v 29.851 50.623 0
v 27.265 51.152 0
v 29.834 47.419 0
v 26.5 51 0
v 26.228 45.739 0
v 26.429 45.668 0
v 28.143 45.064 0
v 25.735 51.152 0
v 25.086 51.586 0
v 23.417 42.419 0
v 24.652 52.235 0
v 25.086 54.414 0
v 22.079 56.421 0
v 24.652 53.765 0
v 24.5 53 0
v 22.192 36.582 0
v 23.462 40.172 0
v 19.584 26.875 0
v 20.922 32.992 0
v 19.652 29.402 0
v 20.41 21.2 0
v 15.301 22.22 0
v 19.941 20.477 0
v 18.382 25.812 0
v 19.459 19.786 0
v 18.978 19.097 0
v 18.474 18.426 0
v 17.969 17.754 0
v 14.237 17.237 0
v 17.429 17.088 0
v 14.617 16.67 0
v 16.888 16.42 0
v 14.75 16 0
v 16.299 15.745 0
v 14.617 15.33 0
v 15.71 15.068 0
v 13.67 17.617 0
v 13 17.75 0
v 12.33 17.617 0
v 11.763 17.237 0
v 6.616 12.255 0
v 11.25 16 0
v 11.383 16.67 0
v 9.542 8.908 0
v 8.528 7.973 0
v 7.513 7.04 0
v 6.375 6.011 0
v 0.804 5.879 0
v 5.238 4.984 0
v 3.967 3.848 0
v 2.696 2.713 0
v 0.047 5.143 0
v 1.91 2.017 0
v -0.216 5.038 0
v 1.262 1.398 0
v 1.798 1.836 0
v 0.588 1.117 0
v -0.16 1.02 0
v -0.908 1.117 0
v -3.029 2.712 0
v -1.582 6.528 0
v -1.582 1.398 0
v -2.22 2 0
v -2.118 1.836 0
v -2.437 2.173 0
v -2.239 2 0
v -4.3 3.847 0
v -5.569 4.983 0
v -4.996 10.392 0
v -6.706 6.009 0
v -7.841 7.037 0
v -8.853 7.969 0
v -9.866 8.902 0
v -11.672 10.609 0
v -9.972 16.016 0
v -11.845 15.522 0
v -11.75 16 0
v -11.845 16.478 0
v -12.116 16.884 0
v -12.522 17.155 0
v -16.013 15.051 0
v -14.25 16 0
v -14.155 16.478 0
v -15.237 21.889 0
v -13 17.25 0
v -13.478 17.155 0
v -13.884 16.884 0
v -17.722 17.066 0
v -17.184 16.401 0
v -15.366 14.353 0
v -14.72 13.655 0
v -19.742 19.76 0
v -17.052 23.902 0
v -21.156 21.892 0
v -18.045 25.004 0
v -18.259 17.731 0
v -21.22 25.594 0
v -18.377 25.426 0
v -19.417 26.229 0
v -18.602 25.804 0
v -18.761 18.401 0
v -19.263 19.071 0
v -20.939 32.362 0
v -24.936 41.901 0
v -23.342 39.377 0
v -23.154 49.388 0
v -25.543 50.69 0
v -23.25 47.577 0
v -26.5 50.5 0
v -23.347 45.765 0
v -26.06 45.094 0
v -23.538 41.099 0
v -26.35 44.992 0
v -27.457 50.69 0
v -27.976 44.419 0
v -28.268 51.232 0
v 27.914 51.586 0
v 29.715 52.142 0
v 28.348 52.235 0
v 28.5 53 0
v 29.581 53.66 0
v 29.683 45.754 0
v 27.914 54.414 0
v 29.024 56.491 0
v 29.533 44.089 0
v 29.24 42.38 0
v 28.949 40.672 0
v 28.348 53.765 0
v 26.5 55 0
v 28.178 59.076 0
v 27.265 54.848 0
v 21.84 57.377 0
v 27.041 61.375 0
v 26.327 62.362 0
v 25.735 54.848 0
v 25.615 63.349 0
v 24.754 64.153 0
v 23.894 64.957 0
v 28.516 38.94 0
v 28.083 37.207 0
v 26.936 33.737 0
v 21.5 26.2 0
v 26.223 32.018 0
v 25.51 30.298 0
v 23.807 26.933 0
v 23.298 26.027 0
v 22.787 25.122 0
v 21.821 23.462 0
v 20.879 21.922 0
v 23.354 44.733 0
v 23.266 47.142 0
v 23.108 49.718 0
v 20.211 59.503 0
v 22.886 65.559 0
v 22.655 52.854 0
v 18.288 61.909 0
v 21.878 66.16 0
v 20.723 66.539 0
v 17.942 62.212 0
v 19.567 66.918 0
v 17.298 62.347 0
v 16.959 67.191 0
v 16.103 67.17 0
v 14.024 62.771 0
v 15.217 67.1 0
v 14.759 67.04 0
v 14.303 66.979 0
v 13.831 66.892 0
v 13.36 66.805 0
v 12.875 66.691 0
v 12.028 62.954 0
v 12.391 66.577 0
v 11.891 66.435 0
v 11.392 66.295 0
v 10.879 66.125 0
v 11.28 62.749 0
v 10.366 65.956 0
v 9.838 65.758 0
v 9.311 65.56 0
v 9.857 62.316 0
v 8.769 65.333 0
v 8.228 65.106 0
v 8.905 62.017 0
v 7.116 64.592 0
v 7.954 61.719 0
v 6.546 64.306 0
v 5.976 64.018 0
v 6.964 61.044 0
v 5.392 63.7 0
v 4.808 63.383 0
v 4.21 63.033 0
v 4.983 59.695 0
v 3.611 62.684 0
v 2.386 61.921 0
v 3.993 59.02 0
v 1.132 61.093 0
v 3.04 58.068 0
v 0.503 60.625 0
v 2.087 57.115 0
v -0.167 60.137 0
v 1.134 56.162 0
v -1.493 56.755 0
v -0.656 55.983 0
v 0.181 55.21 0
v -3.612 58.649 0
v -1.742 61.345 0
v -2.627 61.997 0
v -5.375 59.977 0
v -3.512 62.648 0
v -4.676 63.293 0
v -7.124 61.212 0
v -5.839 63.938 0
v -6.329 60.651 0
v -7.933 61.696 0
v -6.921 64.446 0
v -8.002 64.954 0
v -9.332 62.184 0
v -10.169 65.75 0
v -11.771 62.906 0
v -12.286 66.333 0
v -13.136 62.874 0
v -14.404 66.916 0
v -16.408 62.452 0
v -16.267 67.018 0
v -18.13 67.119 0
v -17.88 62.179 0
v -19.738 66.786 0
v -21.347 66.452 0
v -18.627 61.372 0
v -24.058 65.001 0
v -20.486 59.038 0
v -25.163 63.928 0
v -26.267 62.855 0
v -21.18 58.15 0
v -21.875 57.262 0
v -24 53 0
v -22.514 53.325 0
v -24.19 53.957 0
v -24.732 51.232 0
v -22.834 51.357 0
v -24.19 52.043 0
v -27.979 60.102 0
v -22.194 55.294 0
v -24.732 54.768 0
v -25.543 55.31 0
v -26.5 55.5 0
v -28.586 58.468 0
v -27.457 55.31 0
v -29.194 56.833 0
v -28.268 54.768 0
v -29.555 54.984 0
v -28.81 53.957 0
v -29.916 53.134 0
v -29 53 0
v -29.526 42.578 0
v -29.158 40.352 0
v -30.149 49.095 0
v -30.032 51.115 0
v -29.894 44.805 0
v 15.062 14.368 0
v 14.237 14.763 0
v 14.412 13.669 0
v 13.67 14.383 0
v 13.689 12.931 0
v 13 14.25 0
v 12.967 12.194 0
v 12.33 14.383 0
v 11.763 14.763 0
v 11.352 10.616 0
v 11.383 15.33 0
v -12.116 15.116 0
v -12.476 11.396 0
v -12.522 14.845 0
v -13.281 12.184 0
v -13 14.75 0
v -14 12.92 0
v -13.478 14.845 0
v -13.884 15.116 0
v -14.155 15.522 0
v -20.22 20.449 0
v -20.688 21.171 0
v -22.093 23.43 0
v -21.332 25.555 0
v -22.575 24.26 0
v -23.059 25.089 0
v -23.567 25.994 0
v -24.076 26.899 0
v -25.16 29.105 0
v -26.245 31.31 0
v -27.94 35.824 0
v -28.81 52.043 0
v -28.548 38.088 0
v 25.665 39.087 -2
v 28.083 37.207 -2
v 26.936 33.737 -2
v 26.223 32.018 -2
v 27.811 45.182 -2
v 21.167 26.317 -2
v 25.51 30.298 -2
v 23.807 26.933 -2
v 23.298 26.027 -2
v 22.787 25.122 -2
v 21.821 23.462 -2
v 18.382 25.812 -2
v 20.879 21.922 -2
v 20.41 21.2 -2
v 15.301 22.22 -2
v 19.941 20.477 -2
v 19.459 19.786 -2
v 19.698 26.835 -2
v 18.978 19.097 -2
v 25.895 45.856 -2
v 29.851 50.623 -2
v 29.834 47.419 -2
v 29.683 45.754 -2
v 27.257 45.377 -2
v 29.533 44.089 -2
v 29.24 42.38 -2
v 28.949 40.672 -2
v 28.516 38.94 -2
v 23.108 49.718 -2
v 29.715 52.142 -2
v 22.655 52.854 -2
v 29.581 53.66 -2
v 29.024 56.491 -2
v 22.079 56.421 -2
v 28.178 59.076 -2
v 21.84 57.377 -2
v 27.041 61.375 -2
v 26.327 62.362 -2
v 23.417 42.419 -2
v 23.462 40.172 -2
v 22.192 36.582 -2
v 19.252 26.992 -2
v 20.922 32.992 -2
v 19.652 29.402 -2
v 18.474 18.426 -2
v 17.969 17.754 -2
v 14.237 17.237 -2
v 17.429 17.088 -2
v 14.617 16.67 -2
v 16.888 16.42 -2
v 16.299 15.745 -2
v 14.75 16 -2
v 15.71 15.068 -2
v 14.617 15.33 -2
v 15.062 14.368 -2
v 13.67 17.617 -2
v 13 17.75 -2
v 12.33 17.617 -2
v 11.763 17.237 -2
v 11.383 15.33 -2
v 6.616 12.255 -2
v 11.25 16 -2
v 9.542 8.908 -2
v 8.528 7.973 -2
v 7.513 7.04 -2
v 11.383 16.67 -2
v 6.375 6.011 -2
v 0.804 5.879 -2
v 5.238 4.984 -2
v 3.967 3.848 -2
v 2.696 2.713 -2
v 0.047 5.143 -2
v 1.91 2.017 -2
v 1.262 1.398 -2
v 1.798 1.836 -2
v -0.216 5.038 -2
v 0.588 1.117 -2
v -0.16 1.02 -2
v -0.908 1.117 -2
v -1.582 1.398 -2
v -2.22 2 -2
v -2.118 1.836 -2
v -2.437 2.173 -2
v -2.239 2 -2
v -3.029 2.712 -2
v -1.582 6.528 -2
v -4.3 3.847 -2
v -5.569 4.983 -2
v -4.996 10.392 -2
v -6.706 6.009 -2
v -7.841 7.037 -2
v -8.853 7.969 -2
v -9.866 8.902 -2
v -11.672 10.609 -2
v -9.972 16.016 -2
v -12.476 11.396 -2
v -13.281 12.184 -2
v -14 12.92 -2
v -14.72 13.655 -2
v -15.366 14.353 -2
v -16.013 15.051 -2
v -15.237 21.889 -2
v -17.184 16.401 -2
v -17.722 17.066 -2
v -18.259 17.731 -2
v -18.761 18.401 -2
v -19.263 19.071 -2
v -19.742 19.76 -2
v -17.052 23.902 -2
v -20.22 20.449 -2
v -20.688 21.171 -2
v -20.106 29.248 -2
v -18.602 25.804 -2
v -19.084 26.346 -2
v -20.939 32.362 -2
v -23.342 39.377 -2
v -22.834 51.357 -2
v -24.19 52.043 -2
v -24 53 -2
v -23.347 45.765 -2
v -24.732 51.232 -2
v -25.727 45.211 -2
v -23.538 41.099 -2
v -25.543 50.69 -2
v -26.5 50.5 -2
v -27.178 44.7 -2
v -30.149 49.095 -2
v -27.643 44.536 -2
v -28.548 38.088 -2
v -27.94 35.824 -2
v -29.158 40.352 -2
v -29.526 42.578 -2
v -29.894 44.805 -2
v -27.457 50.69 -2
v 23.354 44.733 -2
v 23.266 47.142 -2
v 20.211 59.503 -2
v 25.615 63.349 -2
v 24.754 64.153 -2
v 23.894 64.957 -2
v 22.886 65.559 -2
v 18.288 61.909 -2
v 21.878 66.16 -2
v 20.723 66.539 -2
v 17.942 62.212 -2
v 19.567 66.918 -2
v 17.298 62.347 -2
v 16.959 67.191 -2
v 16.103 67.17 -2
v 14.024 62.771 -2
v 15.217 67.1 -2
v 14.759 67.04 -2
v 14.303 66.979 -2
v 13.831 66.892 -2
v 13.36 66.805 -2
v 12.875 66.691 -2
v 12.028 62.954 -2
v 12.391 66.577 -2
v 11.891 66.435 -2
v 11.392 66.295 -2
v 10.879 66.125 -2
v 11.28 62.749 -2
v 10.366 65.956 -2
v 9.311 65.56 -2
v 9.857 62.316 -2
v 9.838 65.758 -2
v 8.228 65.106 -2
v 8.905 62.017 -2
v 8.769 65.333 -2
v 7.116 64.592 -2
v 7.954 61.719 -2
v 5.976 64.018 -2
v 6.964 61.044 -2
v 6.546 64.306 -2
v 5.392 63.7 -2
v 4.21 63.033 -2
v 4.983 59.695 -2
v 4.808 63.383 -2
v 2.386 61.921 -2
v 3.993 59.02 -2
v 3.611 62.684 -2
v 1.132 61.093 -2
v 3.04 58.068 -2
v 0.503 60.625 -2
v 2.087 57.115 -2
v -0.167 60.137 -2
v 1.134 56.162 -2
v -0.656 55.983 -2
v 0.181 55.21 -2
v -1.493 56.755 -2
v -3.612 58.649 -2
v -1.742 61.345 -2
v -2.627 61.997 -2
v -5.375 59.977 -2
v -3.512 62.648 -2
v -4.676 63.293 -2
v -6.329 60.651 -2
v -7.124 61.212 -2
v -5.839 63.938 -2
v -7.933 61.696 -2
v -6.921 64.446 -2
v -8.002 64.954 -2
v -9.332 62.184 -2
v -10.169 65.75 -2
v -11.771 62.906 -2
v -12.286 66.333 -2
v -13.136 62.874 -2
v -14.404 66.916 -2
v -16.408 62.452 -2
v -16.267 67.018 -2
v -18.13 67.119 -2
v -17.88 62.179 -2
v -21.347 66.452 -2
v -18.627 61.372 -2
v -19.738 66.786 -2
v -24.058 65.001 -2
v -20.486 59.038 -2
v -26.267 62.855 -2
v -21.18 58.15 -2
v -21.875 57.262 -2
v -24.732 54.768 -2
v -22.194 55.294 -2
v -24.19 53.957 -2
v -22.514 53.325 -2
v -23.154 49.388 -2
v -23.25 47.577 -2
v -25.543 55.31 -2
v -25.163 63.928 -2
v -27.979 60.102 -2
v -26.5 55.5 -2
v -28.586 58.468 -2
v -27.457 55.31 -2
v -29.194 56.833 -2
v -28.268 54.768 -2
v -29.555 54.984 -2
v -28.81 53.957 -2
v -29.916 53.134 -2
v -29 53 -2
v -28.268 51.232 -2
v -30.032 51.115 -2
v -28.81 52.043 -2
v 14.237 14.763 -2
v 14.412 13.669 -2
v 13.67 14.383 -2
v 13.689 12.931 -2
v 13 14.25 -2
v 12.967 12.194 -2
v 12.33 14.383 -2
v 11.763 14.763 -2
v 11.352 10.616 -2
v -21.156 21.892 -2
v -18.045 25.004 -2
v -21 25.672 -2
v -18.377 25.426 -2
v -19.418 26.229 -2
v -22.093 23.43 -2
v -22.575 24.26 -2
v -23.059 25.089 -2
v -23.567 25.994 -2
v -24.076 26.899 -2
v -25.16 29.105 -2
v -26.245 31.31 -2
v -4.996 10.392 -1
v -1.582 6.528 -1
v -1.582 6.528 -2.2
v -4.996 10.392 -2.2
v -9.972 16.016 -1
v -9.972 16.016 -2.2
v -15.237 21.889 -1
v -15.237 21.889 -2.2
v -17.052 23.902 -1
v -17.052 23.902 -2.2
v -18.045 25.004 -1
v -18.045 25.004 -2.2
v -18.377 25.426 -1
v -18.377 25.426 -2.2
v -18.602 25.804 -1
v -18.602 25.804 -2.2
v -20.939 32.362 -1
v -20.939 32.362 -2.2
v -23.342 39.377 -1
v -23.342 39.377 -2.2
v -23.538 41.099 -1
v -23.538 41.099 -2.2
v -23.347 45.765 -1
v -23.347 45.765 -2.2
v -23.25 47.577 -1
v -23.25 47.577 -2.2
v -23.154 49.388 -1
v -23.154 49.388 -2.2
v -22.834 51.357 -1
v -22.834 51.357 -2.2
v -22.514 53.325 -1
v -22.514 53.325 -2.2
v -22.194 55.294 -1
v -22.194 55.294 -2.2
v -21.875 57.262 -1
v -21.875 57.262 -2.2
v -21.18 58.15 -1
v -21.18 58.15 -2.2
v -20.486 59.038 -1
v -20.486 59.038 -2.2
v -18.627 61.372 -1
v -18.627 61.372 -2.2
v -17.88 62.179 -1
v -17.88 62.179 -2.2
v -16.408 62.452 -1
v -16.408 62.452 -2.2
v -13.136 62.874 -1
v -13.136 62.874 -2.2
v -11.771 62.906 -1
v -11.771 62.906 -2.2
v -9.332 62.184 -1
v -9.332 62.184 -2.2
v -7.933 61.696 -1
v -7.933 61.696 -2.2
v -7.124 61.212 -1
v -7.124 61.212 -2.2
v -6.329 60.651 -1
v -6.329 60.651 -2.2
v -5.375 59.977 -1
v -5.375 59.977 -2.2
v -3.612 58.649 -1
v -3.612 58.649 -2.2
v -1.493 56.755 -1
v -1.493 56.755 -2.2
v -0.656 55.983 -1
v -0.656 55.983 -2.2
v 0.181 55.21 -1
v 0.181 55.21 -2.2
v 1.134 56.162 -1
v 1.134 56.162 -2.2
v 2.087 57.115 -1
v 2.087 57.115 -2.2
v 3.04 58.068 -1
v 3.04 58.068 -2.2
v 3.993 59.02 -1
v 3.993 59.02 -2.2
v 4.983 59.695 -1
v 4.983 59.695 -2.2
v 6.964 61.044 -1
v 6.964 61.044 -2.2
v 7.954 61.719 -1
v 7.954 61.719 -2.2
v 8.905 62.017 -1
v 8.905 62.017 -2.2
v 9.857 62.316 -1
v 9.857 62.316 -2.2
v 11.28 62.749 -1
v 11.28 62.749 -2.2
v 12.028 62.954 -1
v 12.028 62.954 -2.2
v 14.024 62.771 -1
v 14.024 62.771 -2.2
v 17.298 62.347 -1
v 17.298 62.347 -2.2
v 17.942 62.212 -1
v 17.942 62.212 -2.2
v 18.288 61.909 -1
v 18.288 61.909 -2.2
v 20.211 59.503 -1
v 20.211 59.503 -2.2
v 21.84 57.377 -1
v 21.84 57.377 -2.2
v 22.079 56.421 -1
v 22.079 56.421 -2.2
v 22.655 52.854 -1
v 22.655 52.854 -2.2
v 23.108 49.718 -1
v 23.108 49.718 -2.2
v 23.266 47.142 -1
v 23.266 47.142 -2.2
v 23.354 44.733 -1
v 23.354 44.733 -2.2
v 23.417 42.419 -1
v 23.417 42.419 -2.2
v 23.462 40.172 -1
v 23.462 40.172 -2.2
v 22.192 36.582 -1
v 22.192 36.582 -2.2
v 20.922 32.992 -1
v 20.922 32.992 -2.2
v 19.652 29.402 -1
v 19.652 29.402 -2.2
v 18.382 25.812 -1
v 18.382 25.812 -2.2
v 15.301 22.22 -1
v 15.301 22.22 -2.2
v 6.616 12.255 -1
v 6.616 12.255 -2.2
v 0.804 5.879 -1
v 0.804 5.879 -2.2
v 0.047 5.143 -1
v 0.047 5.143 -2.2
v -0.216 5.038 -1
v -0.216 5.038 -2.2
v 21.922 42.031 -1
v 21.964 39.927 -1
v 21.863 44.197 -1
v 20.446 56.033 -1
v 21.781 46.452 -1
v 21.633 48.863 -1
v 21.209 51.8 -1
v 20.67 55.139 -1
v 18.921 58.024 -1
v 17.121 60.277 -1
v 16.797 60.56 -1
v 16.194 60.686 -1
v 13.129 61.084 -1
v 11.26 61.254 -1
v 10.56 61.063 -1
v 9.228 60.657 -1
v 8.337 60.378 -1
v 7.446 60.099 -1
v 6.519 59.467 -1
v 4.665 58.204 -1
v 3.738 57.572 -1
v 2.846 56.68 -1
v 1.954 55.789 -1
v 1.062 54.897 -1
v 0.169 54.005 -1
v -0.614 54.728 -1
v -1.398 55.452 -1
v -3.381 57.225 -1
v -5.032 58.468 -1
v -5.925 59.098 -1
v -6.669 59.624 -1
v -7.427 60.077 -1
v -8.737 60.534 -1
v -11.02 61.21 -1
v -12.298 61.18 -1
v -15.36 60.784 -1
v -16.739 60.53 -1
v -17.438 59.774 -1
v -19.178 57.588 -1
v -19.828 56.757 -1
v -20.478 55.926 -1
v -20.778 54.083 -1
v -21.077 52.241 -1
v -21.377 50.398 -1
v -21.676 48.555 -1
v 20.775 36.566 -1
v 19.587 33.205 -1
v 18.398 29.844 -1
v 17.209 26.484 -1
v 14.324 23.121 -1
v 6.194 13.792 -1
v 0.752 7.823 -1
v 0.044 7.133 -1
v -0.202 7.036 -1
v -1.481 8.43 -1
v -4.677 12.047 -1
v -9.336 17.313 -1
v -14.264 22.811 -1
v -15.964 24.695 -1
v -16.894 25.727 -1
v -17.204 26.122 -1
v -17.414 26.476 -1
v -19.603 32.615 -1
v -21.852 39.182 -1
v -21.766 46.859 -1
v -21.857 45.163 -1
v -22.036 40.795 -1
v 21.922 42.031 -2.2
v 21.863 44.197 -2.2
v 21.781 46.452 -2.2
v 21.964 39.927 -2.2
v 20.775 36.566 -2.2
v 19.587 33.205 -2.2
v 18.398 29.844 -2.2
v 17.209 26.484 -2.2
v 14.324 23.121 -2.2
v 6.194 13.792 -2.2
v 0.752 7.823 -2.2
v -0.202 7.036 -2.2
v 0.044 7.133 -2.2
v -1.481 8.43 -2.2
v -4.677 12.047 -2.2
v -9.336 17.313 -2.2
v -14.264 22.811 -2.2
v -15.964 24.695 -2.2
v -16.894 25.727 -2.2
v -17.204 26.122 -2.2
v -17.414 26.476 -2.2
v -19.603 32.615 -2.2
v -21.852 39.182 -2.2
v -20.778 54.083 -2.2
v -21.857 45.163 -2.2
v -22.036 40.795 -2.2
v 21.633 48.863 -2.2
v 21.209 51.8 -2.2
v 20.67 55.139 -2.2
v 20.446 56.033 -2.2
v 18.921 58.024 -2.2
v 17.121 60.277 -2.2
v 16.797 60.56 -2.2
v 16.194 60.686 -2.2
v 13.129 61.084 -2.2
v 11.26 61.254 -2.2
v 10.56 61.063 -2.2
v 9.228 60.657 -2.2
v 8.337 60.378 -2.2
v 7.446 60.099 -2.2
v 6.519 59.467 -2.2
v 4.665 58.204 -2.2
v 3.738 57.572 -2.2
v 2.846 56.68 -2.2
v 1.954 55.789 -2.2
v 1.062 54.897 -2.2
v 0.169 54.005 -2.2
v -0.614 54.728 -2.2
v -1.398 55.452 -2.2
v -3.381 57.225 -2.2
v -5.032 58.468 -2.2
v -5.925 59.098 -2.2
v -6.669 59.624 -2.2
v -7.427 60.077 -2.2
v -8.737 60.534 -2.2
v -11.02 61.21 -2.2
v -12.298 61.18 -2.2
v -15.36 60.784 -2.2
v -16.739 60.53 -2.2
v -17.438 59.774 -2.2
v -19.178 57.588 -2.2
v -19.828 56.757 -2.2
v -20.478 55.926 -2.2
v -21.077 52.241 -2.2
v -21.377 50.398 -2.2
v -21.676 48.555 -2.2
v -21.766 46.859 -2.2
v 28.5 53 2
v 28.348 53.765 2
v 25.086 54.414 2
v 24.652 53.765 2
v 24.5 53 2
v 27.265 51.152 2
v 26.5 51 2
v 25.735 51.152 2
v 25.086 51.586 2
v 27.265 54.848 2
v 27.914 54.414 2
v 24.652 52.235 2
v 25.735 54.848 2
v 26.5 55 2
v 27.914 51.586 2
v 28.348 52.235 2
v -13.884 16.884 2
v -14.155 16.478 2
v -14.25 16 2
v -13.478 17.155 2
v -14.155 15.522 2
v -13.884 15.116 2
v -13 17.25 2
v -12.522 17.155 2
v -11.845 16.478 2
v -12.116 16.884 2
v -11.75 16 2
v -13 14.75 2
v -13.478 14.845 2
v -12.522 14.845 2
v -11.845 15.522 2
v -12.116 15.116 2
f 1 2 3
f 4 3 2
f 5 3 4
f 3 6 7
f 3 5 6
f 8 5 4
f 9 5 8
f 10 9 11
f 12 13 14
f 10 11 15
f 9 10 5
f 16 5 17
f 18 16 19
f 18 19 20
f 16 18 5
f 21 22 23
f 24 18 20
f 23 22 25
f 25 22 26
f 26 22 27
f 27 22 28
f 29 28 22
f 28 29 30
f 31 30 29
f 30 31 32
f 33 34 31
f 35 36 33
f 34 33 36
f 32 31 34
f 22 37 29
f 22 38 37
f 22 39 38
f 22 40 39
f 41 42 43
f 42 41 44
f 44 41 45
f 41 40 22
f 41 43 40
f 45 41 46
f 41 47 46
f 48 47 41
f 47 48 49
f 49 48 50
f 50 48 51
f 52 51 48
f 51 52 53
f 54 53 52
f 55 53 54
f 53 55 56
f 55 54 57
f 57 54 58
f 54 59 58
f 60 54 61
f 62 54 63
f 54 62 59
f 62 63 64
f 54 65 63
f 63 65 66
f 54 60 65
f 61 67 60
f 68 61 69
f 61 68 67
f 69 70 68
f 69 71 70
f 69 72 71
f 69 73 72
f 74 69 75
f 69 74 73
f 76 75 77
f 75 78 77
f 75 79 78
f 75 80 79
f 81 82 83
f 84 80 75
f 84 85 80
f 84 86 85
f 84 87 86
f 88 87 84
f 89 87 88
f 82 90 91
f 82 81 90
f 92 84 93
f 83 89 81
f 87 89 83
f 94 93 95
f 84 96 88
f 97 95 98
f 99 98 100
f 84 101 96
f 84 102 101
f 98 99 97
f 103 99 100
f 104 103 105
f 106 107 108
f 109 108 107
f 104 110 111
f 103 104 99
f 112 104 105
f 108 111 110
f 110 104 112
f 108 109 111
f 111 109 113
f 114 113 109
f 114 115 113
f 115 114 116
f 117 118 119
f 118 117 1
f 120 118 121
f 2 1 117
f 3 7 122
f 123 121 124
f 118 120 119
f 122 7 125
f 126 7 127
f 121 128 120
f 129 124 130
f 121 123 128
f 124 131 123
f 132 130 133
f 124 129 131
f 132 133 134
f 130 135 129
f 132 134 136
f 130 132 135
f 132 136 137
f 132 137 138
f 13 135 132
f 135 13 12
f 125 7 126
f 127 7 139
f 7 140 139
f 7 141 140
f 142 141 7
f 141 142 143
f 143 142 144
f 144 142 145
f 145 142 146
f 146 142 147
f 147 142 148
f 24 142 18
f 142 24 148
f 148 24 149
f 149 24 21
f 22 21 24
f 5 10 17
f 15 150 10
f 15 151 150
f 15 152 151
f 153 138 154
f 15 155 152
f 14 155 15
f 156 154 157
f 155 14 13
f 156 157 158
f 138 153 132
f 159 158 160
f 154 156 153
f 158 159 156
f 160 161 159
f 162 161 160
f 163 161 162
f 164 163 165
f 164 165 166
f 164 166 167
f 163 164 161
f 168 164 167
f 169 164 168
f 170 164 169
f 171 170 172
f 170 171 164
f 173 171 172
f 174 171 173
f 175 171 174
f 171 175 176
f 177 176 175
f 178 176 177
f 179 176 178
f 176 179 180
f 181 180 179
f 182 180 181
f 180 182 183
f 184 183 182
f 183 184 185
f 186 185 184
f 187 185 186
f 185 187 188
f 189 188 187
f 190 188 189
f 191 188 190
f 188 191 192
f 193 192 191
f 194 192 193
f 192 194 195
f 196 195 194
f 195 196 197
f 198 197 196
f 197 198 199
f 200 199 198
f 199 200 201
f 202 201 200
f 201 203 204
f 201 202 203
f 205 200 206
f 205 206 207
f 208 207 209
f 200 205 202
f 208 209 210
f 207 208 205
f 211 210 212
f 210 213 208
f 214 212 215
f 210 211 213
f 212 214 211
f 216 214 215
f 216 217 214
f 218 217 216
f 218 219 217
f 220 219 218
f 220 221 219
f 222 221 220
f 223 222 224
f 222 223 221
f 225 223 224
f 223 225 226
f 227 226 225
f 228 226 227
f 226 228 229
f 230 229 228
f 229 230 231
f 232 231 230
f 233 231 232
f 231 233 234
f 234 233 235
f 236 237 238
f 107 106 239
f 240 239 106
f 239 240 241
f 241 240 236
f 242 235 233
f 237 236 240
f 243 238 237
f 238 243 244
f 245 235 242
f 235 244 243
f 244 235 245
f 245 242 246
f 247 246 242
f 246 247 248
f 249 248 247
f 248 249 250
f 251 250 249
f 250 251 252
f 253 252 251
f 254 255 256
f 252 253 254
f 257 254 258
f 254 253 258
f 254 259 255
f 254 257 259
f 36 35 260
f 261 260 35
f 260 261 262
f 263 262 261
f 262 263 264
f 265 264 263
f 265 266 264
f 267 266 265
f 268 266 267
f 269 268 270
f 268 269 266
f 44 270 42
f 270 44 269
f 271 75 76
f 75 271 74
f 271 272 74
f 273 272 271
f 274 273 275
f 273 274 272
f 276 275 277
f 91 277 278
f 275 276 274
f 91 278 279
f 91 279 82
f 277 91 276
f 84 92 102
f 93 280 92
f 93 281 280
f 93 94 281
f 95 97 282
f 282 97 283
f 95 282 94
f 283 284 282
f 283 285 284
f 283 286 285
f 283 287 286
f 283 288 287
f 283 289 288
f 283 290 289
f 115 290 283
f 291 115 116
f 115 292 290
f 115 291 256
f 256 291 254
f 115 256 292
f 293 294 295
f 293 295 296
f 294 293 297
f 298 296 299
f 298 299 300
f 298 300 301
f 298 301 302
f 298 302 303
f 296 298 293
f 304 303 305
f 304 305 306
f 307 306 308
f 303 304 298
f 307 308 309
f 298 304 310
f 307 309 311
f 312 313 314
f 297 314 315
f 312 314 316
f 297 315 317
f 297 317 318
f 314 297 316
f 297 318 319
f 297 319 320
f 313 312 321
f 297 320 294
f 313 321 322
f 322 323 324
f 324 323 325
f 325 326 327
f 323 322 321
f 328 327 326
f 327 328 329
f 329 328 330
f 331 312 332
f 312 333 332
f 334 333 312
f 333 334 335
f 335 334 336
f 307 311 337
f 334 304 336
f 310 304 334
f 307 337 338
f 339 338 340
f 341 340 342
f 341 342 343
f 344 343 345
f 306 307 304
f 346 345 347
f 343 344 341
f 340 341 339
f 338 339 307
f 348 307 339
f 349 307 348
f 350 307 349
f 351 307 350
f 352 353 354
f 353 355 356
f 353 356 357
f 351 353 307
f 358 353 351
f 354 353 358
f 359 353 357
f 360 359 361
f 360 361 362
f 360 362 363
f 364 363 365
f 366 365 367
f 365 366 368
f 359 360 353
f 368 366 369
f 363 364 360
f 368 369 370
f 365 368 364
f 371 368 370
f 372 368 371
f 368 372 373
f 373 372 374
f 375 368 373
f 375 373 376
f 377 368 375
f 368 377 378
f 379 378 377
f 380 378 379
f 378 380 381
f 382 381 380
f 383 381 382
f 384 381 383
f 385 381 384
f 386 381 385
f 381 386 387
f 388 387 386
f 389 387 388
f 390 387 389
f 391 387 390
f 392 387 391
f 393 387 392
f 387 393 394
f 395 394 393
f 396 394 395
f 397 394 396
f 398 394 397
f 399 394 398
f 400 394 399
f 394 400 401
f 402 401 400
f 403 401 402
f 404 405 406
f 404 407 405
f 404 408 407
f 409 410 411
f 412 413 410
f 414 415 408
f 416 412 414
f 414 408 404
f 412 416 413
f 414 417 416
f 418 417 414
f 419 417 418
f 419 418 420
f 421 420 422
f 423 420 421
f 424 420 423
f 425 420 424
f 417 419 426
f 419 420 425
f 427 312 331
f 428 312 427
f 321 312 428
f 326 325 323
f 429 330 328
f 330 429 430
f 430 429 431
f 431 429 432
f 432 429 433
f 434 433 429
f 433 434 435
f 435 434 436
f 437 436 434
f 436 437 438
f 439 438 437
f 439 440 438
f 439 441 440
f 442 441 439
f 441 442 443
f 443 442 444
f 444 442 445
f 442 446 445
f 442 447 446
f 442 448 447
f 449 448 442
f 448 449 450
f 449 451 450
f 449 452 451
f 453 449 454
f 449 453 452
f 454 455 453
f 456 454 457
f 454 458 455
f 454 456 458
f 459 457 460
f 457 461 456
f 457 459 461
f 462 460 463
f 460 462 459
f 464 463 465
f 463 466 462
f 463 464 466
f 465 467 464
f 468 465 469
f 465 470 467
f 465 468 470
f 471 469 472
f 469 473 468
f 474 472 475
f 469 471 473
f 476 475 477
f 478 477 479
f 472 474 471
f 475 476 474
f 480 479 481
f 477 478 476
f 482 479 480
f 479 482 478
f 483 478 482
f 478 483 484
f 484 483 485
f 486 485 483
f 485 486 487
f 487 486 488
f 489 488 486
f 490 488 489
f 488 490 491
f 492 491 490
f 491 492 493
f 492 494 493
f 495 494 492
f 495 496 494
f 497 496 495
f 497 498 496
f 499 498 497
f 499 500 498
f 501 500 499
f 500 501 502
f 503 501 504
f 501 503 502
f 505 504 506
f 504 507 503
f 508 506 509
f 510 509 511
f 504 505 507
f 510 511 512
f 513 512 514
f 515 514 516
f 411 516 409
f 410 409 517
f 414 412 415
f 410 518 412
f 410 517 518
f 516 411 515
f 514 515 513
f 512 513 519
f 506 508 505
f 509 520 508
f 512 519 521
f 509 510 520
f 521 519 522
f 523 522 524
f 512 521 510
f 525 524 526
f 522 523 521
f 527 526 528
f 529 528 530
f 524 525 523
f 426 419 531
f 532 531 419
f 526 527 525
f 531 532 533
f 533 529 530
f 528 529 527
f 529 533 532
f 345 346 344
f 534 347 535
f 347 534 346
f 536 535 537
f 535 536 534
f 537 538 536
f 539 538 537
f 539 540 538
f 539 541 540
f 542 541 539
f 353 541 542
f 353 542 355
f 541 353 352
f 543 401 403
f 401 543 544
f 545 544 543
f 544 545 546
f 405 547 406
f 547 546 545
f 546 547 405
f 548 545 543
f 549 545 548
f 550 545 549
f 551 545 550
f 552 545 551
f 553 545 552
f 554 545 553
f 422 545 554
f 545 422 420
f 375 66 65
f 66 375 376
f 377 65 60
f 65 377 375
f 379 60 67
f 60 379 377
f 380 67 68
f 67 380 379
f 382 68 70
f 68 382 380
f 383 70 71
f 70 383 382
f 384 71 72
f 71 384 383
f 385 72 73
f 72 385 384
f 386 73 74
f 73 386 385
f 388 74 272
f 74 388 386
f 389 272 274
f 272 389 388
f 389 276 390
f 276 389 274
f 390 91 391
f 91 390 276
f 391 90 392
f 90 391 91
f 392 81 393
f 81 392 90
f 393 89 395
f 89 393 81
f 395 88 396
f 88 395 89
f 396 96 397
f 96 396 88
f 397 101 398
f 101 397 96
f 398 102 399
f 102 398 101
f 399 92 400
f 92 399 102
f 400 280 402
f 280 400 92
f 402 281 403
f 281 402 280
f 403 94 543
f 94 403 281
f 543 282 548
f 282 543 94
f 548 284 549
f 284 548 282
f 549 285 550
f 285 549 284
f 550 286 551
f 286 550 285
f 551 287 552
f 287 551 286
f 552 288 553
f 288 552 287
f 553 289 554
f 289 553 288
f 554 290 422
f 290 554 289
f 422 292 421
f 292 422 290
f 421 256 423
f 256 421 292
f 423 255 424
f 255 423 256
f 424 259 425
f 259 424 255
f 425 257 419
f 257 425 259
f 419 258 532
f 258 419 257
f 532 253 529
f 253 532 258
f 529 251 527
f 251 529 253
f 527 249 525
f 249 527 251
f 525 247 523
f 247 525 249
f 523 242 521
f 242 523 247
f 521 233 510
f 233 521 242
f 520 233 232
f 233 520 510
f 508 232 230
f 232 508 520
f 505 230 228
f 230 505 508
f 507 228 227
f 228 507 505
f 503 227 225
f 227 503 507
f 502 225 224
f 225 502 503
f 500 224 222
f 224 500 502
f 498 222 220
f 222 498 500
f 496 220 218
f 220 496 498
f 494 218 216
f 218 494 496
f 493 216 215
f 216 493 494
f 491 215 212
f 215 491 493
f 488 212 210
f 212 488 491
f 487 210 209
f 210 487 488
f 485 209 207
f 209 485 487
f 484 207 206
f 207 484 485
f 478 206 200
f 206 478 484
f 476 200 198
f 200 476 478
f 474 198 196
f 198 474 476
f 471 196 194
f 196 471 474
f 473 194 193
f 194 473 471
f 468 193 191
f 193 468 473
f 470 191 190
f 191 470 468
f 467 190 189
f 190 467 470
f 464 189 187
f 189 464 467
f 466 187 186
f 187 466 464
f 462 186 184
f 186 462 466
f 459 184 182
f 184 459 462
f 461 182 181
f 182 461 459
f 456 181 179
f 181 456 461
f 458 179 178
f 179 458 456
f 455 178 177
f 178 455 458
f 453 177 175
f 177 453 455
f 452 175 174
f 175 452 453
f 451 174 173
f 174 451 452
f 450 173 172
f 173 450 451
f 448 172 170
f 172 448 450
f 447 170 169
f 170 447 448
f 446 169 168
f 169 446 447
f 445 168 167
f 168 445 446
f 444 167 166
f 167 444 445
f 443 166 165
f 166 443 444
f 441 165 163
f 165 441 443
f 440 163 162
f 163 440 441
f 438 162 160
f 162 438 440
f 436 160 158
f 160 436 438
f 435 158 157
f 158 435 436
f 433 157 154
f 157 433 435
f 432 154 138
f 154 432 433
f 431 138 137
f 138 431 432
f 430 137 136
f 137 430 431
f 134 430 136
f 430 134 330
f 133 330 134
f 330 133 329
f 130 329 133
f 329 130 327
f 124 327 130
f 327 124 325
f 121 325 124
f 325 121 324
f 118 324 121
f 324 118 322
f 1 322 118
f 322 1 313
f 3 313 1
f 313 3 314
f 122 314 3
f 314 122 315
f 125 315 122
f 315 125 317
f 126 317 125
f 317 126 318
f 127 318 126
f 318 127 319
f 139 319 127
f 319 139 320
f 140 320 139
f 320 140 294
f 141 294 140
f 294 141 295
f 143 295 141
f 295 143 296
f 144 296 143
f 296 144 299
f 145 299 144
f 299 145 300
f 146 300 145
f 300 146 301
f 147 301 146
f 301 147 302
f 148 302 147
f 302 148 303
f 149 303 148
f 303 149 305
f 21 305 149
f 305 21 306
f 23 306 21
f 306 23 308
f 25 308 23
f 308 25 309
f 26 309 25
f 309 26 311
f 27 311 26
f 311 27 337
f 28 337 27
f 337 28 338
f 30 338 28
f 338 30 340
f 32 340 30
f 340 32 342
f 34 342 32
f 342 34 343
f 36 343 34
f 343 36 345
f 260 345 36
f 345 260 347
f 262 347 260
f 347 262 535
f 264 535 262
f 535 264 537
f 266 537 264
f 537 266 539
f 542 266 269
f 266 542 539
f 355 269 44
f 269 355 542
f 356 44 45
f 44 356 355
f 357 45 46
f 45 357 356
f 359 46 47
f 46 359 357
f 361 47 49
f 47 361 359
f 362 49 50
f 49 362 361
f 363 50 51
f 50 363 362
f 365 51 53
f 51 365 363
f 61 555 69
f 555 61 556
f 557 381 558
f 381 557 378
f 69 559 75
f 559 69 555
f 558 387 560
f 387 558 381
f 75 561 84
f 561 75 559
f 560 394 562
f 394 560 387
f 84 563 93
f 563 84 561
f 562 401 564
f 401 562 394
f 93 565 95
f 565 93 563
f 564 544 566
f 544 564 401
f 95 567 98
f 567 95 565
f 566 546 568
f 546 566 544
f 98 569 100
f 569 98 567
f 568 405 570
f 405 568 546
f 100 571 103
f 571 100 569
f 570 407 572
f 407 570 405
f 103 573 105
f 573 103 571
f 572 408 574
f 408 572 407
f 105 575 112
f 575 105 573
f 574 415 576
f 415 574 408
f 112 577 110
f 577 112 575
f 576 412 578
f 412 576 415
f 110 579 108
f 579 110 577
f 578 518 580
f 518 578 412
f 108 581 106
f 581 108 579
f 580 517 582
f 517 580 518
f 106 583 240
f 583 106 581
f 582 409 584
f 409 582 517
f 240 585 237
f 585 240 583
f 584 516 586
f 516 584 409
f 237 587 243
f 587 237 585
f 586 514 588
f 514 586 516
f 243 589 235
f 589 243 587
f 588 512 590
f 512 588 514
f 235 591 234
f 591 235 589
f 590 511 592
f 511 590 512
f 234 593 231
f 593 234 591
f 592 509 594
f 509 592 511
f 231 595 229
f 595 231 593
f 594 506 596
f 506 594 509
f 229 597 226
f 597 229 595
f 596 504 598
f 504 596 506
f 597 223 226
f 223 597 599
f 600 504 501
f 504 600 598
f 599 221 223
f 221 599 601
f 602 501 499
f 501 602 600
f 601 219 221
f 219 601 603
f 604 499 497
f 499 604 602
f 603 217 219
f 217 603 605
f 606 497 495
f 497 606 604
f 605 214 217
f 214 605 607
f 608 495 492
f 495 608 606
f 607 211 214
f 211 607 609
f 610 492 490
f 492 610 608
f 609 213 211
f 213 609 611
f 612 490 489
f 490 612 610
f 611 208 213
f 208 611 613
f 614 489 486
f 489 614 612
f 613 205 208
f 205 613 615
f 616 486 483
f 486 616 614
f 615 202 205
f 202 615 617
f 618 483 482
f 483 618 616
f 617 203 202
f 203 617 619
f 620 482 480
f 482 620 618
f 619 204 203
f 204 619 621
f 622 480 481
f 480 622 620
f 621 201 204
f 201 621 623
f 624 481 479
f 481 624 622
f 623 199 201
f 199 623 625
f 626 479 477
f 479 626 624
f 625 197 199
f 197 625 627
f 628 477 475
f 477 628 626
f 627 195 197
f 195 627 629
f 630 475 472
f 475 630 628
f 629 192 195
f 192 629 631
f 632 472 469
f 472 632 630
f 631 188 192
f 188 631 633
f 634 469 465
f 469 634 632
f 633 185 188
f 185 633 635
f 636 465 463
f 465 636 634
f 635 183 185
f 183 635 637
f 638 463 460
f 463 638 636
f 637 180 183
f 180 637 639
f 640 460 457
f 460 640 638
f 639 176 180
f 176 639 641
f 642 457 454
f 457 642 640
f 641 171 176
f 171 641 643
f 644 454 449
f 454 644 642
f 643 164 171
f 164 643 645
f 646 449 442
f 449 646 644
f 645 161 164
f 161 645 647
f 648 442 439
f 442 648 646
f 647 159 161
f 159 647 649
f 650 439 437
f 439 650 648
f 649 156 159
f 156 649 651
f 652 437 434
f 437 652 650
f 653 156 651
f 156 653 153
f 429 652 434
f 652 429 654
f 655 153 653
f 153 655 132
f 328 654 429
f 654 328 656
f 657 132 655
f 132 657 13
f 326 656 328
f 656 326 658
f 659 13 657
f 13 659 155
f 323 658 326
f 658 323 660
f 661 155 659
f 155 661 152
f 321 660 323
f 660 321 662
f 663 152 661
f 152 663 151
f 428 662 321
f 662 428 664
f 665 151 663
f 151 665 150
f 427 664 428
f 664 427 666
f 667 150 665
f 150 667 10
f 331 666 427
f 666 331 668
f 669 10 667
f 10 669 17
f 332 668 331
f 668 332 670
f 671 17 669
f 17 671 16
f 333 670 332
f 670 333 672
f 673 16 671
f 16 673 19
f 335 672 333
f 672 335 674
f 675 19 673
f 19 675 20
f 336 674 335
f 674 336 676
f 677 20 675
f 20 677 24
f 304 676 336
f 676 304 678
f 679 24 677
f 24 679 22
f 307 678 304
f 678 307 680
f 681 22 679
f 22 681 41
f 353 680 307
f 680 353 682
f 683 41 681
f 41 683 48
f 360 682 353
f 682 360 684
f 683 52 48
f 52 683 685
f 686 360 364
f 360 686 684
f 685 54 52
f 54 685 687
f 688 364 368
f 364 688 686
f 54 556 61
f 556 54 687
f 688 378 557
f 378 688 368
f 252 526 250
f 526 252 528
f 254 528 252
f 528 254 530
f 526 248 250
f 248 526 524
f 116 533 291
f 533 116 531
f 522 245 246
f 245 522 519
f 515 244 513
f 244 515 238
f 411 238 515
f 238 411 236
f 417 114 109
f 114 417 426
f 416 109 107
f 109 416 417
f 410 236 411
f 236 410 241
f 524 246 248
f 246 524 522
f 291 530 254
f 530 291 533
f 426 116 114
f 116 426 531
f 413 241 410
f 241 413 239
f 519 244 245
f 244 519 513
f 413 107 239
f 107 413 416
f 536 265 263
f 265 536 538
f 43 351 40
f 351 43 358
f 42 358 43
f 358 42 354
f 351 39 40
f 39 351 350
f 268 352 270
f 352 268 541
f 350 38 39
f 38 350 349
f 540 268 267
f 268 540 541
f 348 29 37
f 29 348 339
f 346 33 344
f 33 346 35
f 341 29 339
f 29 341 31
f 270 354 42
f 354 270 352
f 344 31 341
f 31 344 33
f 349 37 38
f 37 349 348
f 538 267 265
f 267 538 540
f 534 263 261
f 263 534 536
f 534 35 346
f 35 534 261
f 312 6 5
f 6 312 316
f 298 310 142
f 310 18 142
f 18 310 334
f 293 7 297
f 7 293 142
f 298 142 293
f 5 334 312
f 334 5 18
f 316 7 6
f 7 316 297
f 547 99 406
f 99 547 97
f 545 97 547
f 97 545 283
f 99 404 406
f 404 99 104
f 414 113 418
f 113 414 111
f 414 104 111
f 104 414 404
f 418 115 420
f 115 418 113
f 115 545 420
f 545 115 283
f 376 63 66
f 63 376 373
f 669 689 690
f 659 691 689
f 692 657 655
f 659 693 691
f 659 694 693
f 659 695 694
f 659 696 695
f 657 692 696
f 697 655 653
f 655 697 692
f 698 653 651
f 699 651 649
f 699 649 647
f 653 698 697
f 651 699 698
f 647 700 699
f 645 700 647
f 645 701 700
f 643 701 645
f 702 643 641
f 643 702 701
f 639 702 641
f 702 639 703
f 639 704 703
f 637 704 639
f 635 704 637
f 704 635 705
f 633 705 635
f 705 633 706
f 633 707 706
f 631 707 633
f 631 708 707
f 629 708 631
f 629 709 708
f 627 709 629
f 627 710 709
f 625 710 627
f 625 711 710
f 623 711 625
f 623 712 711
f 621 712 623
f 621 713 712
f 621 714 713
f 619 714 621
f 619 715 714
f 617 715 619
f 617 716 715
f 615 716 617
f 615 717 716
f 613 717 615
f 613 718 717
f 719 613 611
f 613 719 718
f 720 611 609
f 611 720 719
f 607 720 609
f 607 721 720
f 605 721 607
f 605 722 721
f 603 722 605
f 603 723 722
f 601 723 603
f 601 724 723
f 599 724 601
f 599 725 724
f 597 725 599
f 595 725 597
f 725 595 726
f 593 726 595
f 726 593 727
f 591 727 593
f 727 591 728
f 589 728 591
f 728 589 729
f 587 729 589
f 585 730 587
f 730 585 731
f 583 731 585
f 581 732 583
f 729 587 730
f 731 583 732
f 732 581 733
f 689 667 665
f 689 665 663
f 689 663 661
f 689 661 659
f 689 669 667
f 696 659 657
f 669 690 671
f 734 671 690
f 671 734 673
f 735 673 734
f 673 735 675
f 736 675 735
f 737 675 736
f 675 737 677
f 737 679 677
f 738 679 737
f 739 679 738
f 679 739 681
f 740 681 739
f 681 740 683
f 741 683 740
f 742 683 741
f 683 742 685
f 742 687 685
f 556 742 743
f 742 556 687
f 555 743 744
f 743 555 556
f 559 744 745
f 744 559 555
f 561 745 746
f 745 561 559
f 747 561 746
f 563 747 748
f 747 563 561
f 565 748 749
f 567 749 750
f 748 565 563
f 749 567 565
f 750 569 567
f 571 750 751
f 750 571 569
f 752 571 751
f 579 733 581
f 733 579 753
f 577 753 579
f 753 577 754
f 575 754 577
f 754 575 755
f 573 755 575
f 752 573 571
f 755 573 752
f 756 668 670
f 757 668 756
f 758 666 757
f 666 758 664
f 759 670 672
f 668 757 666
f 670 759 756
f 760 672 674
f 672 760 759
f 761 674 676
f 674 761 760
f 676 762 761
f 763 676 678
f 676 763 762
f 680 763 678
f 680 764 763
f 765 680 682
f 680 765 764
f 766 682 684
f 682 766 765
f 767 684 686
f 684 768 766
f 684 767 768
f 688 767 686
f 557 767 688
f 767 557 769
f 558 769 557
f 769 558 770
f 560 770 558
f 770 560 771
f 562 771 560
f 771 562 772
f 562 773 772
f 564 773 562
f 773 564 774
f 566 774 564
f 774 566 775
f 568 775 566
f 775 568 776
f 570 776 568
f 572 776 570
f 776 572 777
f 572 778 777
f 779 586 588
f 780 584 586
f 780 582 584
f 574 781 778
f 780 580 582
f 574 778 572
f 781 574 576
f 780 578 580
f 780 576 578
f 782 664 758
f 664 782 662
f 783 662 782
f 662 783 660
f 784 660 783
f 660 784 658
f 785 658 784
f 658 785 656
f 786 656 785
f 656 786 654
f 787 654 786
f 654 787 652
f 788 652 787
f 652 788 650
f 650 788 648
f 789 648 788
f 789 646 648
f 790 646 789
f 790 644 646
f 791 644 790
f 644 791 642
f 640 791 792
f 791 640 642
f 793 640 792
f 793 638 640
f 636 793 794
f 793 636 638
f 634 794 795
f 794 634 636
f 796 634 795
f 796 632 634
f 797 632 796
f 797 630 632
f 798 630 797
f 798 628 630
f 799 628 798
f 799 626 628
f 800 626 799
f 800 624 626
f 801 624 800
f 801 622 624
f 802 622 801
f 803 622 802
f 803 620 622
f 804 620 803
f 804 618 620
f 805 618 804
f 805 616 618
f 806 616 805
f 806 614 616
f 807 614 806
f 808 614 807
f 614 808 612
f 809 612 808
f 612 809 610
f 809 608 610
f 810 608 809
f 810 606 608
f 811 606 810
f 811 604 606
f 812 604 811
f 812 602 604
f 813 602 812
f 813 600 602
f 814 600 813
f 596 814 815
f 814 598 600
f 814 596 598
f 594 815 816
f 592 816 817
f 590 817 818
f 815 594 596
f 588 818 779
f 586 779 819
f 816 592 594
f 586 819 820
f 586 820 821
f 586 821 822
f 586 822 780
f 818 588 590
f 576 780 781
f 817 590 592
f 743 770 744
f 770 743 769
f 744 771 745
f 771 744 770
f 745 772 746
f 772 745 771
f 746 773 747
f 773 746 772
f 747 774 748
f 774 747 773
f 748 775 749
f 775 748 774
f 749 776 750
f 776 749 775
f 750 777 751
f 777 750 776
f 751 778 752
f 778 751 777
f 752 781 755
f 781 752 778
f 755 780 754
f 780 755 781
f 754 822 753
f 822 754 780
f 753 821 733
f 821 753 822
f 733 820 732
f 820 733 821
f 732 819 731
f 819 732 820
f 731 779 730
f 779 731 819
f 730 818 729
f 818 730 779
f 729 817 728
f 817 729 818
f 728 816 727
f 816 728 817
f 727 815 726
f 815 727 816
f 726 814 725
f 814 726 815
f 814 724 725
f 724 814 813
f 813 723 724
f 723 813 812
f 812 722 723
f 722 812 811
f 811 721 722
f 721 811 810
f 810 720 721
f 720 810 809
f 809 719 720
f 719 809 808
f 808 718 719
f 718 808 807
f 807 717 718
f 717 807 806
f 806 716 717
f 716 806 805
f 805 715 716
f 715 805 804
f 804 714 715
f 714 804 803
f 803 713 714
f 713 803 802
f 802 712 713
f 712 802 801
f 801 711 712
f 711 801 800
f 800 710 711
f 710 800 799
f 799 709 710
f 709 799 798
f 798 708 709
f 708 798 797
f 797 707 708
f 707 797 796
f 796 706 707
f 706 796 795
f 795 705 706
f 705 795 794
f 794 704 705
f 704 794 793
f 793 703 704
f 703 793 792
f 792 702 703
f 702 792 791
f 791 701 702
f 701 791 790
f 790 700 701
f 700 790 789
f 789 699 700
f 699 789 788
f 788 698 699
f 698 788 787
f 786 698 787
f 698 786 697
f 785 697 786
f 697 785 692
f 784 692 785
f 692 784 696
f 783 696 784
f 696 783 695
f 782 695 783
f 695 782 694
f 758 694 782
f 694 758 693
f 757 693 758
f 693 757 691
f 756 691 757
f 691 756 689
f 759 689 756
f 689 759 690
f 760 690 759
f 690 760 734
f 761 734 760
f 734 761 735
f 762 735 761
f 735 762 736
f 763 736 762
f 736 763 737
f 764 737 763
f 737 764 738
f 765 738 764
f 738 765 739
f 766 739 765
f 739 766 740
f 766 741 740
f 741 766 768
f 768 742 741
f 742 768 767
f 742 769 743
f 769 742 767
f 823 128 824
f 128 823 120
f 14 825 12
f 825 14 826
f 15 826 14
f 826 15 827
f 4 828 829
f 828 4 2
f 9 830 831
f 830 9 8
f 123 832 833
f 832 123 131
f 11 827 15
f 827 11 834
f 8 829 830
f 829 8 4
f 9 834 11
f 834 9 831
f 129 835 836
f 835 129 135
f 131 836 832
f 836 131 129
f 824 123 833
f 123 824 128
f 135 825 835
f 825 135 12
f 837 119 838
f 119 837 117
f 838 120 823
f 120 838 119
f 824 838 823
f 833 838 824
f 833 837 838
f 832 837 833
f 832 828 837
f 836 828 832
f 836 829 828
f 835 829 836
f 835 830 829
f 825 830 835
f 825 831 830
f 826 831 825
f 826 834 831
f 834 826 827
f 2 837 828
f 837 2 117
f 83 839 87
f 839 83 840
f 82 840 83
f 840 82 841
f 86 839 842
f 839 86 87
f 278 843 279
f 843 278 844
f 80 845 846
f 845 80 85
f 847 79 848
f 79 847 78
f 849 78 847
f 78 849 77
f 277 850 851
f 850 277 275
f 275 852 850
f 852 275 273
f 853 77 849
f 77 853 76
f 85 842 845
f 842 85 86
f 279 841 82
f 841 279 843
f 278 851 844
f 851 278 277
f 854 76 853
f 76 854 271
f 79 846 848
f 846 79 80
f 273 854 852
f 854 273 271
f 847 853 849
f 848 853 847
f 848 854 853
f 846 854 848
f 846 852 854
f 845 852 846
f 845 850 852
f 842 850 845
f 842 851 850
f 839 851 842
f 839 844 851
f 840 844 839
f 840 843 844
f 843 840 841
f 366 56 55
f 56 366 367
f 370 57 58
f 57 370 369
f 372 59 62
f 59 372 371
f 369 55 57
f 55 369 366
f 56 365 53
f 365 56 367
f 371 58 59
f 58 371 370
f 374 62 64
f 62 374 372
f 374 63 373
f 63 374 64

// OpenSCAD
rotate([0,180,0]) union() {
	difference() {
		translate([-30,0,0]) linear_extrude(2) resize([60,0,0],auto=true) import("outer_heart.dxf");
		translate([-23.5,5,0]) linear_extrude(2) resize([47,0,0],auto=true) import("inner_heart.dxf");
		translate([26.5,53,1]) cylinder(r=2.5,h=2,center=true,$fn=16);
		translate([-13,16,1]) cylinder(r=1.75,h=2,center=true,$fn=16);
		translate([-21.5,26.2,0]) rotate([0,10,19.4]) cube([2,20,3]);
		translate([19.5,26.2,-.5]) rotate([0,-10,-19.4]) cube([2,20,3]);
		// For pointed tip comment this line and the last
		translate([-2.4,0,0]) cube([5,2,2]);
	}
	translate([0,0,1]) difference() {
		translate([-23.5,5,0]) linear_extrude(1.2) resize([47,0,0],auto=true) import("inner_heart.dxf");
		translate([-22,7,0]) linear_extrude(1.2) resize([44,0,0],auto=true) import("inner_heart.dxf");
	}
	translate([-26.5,53,-1]) cylinder(r=2,h=2,center=true,$fn=16);
	translate([13,16,-1]) cylinder(r=1.25,h=2,center=true,$fn=16);
	// for pointed tip comment this line and the indicated one above
translate([0.16,3,0]) scale([1.1,.9,1]) linear_extrude(2) circle(2.2,$fn=20);
}
